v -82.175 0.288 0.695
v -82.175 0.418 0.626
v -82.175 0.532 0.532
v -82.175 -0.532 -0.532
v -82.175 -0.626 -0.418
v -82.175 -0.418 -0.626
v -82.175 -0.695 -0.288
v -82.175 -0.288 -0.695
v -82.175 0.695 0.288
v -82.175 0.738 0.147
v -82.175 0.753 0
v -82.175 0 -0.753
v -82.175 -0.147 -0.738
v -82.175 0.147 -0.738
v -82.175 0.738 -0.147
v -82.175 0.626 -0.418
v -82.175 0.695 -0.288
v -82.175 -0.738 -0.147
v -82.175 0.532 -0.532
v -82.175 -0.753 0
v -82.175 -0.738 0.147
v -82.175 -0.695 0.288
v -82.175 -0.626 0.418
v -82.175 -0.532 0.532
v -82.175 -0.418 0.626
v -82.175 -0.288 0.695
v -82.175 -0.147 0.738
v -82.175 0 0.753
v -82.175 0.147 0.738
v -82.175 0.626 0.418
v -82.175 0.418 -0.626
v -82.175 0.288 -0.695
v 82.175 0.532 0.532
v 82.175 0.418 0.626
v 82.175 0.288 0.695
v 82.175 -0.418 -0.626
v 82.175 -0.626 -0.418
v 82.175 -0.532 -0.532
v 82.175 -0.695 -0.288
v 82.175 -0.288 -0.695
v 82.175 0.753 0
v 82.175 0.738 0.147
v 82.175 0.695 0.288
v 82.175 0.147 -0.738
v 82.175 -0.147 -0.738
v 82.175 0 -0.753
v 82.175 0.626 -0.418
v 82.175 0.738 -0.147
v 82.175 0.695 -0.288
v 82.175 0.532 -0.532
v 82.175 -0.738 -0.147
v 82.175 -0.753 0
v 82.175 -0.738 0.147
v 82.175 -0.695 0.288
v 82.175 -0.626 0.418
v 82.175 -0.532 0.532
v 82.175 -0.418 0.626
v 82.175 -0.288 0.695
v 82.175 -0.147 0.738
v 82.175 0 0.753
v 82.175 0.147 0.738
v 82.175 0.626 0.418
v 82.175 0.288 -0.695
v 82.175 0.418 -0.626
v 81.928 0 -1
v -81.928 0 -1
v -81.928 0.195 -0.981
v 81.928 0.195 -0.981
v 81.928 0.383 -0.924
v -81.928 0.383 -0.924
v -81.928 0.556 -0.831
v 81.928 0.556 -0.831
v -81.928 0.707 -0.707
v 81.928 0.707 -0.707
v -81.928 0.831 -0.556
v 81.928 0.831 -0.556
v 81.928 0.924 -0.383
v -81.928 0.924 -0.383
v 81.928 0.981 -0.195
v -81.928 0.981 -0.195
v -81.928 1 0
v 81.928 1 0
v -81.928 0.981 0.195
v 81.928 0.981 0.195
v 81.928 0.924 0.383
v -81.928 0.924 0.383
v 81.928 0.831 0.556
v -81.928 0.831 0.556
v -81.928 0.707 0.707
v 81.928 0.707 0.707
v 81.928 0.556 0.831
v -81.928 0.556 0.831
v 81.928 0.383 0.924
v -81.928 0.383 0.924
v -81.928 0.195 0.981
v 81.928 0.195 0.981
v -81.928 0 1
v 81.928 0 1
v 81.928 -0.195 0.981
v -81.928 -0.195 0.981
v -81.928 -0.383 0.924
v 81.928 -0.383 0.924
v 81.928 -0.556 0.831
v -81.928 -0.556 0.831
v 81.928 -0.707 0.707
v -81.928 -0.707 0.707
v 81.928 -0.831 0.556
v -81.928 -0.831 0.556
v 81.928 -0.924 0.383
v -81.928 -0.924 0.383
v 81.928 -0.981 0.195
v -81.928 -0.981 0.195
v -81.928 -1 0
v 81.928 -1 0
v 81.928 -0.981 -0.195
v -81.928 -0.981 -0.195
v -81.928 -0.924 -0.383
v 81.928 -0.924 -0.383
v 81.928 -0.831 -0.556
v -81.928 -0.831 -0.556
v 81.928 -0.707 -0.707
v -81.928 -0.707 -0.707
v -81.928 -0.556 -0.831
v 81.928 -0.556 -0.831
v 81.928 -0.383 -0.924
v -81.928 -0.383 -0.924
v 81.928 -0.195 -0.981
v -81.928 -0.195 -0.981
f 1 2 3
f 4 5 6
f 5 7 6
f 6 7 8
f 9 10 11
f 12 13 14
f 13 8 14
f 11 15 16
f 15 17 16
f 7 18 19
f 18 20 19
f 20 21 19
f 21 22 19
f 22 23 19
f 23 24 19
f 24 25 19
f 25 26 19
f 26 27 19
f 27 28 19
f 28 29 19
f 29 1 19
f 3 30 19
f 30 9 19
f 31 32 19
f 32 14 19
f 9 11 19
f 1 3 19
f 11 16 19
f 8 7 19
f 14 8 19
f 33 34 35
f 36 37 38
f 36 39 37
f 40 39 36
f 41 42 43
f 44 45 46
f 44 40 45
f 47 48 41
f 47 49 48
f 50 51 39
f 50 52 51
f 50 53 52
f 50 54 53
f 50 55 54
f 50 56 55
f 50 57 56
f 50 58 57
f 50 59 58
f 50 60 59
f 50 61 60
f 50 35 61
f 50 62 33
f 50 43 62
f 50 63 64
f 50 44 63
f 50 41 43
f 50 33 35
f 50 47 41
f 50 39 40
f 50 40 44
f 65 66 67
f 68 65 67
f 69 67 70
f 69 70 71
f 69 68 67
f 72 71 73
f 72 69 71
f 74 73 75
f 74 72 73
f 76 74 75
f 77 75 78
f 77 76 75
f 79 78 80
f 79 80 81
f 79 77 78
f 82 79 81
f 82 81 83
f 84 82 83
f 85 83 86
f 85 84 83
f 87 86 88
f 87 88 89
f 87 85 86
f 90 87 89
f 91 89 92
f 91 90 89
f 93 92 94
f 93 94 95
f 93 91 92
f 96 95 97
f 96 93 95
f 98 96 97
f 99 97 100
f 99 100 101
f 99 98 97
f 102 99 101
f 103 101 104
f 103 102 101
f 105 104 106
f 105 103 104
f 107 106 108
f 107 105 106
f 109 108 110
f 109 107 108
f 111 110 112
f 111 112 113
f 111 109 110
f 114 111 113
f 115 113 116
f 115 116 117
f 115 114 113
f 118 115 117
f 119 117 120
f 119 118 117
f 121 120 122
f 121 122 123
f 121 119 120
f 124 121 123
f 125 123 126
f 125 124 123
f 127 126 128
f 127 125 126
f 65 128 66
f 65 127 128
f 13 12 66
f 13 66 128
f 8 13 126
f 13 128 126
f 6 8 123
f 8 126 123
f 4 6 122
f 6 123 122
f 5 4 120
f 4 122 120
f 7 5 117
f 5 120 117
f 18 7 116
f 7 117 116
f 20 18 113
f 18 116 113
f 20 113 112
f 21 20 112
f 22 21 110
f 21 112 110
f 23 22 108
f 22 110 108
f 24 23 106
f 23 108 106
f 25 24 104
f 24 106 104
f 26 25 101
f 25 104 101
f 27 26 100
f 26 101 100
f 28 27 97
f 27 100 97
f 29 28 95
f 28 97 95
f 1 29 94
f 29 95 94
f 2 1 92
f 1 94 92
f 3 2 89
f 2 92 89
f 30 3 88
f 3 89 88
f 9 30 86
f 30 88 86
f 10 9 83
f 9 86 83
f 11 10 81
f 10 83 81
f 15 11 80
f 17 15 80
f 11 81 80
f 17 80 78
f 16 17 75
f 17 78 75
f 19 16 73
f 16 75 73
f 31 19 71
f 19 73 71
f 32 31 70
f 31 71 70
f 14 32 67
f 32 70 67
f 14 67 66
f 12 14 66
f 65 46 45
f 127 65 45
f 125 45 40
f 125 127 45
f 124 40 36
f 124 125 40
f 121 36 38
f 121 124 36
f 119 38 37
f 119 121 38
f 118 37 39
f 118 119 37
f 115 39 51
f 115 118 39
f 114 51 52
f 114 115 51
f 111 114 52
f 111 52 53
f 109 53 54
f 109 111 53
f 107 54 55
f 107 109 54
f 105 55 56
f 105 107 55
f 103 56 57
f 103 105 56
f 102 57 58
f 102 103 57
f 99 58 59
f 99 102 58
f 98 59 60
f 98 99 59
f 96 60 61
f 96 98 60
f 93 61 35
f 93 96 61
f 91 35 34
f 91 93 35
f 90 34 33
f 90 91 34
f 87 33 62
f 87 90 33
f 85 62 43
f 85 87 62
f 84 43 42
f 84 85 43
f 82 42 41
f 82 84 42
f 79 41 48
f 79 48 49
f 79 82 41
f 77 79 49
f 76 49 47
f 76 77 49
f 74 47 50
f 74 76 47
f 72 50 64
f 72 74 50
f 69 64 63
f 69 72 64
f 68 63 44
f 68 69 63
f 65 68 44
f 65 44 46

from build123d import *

# Parameters (mm, degrees)
SKETCH2_R                = 1
BOSS_EXTRUDE1_DEPTH      = 82.175
BOSS_EXTRUDE1_DEPTH_BACK = 82.175
SKETCH5_OUTSIDE_W        = 367.574
SKETCH5_OUTSIDE_H        = 367.574
SKETCH5_OUTSIDE_R        = 0.75256417
CUT_EXTRUDE1_DEPTH       = 165.35
CUT_EXTRUDE1_TAPER       = 45


with BuildPart() as part:
    # Sketch2 → Boss-Extrude1 (new body, two sides)
    with BuildSketch(Plane(origin=(0, 0, 0), x_dir=(0, 0, -1), z_dir=(1, 0, 0))) as boss_extrude1_sk:
        Circle(SKETCH2_R)
    extrude(amount=BOSS_EXTRUDE1_DEPTH)
    extrude(boss_extrude1_sk.sketch, amount=-BOSS_EXTRUDE1_DEPTH_BACK)

    # Sketch5 outside → Cut-Extrude1 (cut, through all)
    with BuildSketch(Plane(origin=(82.175, 0, 0), x_dir=(0, 0, -1), z_dir=(1, 0, 0))):
        Rectangle(SKETCH5_OUTSIDE_W, SKETCH5_OUTSIDE_H)
        Circle(SKETCH5_OUTSIDE_R, mode=Mode.SUBTRACT)
    cut_extrude1 = extrude(amount=-CUT_EXTRUDE1_DEPTH, taper=CUT_EXTRUDE1_TAPER, mode=Mode.SUBTRACT)

    # Mirror1: Cut-Extrude1 across plane
    add(cut_extrude1.mirror(Plane(origin=(0, 0, 0), x_dir=(0, 0, 1), z_dir=(1, 0, 0))), mode=Mode.SUBTRACT)


solid = part.part
